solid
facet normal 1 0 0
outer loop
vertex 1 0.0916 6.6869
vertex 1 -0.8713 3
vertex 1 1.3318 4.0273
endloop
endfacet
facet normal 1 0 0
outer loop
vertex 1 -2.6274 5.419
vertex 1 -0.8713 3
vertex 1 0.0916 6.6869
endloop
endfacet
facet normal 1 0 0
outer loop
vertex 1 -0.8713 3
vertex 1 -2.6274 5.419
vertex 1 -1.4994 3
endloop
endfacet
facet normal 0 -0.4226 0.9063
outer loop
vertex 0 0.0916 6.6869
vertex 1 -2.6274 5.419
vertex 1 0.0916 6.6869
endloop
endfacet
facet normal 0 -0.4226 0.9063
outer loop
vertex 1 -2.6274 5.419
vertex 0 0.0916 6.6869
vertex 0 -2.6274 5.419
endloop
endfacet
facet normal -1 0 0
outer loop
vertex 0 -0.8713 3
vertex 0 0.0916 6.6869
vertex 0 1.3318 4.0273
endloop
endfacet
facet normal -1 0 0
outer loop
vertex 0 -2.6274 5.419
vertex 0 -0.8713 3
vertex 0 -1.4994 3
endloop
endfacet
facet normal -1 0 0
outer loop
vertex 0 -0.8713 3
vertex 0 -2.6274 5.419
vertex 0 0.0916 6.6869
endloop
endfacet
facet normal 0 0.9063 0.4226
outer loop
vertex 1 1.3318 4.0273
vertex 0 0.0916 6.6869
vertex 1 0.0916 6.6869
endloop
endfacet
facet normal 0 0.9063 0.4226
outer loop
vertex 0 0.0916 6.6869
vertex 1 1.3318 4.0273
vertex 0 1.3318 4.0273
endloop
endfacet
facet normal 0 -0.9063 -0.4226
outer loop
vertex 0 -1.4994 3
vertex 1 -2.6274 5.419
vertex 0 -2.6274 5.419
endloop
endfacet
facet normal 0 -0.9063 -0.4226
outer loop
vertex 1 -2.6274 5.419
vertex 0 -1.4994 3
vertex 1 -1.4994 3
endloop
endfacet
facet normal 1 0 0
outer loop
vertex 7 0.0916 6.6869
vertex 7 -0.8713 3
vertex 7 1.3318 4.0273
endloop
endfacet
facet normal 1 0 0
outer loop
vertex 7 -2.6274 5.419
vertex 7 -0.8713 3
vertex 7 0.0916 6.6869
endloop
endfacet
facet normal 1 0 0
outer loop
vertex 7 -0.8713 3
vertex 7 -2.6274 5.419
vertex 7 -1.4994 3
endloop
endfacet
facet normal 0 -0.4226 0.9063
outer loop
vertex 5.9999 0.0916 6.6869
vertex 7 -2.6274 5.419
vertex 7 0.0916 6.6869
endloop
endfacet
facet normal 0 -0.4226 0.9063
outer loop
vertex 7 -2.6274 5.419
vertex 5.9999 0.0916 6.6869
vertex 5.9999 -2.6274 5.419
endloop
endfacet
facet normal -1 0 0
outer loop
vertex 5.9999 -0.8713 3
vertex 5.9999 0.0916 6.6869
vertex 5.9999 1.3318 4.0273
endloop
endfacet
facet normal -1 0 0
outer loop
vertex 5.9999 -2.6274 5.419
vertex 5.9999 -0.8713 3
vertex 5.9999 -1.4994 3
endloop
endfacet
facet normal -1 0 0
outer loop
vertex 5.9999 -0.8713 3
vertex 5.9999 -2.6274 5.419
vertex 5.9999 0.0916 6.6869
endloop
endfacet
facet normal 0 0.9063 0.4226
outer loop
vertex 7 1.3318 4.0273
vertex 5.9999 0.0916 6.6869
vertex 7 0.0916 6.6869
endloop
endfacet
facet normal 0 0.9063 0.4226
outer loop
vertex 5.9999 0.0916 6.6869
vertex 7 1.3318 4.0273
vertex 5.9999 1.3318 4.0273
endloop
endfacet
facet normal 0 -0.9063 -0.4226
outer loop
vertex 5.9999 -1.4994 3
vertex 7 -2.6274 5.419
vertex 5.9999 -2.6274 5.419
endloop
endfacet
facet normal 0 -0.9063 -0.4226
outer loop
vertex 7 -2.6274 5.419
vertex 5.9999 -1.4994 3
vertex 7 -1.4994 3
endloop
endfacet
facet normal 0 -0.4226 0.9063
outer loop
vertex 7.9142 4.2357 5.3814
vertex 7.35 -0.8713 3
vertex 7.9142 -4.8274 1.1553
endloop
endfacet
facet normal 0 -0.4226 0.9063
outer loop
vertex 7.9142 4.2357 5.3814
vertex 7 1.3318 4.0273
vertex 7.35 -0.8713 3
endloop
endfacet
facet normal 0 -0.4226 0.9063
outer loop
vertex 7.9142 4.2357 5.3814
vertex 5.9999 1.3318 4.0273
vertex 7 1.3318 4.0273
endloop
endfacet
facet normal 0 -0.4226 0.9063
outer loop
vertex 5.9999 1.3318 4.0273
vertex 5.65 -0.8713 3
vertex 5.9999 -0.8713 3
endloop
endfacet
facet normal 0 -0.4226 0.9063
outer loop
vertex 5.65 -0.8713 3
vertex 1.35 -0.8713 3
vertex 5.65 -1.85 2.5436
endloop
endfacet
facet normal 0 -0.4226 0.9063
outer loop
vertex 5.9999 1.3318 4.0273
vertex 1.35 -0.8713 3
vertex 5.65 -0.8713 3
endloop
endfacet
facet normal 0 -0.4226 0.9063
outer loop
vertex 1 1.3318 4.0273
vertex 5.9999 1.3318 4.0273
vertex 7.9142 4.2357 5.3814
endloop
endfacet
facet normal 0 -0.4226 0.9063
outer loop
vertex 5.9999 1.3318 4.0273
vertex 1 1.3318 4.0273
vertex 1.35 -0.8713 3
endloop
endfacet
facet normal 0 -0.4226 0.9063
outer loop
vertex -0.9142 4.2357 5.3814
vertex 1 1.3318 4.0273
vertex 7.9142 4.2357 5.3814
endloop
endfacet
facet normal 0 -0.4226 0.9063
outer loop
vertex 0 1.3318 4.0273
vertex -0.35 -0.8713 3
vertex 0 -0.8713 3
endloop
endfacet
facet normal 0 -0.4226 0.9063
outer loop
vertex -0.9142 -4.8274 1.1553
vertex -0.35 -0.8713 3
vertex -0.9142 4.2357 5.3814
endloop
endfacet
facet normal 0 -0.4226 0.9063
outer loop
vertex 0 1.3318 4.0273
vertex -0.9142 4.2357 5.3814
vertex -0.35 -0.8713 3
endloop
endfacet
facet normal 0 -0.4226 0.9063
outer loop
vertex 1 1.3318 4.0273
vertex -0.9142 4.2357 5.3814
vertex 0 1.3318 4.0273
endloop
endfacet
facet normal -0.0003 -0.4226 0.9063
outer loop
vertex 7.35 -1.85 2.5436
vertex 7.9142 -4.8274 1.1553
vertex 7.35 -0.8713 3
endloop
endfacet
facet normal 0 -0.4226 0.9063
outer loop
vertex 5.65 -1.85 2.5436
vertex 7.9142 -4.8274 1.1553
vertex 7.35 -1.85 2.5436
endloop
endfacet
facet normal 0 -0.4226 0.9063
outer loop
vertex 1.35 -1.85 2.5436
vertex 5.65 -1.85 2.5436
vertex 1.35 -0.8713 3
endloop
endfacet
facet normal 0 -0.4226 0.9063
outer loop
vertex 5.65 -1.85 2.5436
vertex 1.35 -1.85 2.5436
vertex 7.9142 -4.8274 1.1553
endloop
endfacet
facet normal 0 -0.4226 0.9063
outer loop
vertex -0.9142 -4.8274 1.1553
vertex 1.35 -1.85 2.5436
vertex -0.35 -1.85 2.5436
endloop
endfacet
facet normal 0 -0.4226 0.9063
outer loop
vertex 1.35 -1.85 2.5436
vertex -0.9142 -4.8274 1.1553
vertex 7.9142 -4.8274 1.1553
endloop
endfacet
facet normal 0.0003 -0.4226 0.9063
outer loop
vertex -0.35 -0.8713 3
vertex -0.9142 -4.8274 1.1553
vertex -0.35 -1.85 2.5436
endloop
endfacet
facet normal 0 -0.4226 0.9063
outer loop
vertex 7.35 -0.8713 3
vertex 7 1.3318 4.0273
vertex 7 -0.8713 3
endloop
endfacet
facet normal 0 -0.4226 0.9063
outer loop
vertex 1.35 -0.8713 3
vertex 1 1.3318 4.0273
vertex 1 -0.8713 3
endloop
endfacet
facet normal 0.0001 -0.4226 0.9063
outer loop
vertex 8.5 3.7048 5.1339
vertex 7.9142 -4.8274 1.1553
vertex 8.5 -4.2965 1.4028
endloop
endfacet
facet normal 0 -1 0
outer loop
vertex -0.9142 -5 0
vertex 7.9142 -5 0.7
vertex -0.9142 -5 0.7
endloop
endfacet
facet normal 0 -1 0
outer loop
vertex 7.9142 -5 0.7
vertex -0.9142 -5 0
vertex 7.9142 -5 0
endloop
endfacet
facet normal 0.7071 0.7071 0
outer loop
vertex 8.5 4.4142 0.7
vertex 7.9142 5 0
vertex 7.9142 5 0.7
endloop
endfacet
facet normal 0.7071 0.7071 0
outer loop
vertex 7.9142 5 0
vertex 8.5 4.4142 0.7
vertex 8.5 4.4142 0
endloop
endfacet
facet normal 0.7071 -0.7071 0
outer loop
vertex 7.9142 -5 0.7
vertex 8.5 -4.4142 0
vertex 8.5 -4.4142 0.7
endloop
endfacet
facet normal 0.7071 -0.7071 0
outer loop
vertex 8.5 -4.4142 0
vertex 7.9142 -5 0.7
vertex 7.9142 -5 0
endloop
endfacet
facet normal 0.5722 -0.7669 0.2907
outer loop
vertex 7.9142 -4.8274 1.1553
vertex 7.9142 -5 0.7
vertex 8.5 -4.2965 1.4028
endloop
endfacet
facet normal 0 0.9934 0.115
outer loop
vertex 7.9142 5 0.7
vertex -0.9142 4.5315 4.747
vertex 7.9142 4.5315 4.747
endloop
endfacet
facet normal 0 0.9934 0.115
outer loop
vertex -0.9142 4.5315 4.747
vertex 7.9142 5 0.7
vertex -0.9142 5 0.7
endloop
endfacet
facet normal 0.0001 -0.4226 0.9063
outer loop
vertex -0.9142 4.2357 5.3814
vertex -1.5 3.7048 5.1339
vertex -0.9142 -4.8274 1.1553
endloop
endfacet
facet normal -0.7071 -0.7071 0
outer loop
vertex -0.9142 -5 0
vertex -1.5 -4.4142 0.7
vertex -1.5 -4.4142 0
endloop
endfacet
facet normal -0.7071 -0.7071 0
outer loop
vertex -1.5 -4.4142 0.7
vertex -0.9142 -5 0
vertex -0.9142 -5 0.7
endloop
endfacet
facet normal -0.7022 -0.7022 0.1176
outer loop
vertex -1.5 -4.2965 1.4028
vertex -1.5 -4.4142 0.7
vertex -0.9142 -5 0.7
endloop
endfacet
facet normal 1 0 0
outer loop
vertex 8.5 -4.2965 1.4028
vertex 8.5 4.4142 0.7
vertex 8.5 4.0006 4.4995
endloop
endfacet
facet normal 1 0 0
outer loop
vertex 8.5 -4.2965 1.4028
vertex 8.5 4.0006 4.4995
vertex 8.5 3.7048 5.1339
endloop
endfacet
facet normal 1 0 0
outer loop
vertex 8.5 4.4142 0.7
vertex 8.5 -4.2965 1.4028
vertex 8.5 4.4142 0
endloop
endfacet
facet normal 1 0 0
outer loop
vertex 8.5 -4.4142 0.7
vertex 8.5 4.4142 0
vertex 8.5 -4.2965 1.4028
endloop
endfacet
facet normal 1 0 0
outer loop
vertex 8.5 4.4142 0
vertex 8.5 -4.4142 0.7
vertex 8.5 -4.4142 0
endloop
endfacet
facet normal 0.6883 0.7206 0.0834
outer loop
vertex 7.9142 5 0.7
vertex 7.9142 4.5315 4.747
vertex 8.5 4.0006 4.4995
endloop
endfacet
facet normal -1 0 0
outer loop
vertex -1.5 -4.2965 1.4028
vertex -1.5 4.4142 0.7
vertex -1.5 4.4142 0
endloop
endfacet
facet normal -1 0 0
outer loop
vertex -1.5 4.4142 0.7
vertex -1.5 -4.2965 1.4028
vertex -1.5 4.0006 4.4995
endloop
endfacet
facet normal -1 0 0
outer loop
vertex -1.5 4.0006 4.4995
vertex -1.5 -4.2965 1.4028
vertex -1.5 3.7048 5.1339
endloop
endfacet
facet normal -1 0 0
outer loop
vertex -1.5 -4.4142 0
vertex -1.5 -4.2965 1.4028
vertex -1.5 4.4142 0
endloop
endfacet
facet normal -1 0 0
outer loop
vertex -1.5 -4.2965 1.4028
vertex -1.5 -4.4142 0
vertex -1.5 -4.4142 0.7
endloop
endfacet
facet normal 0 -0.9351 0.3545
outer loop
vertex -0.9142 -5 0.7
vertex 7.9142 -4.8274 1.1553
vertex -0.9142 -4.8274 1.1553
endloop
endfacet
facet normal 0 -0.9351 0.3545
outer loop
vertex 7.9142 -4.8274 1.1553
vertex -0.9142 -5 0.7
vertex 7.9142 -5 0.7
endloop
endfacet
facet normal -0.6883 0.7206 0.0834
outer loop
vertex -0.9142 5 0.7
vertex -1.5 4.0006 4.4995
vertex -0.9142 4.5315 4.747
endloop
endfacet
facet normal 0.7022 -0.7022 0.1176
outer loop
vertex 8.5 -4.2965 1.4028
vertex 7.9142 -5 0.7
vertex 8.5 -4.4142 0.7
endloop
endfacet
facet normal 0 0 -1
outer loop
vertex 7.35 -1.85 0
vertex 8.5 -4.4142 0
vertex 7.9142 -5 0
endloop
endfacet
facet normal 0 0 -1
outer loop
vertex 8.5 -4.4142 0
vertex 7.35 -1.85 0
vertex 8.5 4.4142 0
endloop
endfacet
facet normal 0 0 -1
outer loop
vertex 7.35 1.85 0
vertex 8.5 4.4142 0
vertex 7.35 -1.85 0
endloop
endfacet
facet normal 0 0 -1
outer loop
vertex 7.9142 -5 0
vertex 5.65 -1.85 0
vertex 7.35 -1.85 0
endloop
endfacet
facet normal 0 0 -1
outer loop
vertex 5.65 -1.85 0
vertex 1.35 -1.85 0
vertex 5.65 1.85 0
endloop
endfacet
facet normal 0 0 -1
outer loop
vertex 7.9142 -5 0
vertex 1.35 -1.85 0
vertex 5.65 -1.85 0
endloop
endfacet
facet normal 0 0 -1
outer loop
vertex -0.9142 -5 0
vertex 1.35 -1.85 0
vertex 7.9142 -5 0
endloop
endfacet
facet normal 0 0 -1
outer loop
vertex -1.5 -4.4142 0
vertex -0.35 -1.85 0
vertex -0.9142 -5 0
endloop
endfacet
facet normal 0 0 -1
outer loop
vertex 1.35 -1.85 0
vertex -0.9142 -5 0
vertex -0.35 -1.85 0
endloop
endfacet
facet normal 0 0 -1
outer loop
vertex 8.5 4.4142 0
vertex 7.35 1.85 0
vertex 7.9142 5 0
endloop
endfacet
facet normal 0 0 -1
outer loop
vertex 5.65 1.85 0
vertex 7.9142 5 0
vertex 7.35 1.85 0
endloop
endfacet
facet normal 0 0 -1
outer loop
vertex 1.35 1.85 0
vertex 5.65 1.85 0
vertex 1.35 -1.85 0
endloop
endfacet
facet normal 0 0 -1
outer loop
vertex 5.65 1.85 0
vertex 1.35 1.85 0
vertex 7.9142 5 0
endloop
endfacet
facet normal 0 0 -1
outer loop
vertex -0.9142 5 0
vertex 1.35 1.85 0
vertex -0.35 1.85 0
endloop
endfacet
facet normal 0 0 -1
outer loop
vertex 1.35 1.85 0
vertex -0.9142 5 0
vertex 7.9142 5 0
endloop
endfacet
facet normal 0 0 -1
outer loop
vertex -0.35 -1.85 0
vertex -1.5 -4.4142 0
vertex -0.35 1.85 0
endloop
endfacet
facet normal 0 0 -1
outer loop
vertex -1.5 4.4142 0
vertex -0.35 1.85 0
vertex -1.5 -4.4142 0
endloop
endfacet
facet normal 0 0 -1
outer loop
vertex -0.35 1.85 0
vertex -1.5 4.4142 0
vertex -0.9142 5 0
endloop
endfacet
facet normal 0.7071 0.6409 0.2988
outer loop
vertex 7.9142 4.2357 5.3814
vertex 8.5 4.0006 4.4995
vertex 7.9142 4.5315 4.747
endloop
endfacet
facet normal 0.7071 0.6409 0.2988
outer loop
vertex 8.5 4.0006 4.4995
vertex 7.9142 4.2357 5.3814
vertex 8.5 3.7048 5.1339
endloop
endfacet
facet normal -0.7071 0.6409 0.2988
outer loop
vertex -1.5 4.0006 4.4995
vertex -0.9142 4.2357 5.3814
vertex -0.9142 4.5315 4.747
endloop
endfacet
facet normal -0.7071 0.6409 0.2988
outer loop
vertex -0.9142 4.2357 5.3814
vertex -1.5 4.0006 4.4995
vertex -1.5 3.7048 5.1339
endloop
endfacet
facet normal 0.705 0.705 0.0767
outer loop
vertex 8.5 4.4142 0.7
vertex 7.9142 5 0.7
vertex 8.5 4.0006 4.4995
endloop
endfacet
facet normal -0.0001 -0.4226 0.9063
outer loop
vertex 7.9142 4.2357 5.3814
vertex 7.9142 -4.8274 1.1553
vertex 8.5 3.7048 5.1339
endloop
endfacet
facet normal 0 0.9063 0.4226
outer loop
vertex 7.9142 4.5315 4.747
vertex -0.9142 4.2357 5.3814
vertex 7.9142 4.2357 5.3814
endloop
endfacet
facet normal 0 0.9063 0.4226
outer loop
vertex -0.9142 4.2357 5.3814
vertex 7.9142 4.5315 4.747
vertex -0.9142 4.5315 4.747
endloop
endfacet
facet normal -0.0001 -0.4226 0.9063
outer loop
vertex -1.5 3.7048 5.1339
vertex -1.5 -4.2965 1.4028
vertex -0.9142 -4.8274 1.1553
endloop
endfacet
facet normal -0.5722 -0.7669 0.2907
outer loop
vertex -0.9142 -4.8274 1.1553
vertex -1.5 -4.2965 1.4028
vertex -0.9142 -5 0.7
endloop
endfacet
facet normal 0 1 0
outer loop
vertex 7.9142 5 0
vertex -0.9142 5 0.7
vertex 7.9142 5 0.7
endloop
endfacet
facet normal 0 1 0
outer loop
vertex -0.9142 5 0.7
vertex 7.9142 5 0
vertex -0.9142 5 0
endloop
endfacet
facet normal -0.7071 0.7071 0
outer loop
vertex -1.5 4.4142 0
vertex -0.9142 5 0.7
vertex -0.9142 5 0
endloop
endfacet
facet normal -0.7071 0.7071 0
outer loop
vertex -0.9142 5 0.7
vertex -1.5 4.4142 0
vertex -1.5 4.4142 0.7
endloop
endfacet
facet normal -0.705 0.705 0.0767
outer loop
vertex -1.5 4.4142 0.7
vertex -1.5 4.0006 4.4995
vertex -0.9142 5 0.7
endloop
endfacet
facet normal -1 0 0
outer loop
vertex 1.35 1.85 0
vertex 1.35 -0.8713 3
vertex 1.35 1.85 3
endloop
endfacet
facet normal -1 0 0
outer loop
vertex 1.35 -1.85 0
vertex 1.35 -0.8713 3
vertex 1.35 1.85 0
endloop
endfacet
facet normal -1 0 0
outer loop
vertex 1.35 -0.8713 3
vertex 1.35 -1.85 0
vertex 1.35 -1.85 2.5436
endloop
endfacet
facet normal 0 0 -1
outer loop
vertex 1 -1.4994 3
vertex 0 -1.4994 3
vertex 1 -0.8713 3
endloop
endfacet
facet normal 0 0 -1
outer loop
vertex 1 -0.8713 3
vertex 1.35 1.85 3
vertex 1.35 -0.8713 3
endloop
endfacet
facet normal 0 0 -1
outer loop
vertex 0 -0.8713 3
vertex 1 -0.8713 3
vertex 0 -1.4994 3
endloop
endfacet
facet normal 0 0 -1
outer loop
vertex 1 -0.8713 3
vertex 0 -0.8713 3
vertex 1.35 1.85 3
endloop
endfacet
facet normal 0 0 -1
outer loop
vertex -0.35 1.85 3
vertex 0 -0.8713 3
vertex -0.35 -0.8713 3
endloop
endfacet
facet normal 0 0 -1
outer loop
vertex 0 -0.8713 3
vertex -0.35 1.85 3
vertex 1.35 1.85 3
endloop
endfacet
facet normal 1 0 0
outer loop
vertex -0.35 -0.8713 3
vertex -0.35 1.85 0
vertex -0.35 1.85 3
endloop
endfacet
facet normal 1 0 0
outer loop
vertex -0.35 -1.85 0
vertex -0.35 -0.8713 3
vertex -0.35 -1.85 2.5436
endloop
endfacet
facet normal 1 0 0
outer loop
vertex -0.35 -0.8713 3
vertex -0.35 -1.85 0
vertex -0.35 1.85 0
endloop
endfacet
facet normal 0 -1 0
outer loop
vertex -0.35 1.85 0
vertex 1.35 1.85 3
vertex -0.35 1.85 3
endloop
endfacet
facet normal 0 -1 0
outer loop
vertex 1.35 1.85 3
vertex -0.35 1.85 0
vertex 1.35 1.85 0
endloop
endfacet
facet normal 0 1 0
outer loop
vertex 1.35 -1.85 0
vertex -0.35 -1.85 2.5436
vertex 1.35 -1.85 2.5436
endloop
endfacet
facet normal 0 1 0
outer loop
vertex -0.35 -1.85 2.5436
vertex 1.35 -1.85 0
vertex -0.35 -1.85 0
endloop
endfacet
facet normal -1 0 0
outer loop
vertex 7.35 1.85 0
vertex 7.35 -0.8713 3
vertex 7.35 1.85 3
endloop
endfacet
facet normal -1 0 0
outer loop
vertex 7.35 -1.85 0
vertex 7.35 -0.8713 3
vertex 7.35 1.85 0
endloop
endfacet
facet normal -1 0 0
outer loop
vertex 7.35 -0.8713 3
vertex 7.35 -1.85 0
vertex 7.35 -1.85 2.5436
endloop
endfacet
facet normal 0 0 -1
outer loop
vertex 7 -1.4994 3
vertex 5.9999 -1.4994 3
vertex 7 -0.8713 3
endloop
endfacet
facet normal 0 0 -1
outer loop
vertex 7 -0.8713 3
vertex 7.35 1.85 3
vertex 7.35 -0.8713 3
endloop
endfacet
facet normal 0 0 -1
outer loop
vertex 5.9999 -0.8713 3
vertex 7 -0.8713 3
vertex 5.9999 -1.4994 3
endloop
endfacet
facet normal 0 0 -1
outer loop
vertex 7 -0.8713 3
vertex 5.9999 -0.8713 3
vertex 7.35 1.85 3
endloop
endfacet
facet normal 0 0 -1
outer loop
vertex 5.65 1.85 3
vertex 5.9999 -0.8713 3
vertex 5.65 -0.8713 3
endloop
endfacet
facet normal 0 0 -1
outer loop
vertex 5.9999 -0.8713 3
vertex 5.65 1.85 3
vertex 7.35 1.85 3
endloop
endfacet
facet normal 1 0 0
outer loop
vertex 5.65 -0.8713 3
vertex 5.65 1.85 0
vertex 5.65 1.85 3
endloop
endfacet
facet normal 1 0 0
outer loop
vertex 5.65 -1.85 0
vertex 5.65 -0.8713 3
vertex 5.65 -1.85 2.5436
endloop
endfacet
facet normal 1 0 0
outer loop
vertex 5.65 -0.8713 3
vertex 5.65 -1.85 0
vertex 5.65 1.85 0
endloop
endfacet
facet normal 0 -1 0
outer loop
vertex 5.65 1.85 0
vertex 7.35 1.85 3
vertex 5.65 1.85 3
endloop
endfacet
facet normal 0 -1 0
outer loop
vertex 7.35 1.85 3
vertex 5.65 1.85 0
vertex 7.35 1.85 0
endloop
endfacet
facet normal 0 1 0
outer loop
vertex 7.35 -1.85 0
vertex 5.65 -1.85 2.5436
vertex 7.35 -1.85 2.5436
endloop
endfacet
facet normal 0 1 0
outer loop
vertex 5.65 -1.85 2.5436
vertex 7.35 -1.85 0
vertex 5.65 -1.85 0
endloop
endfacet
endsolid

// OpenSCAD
$fn=100;
g=0.7;
angle=25;
t=1;
height=2+1.5*sin(angle);

difference() {
  union () {
    tilt();
    translate([0,0,height+g])
    rotate([angle,0,0])
    pins();
  }
  translate([0,0,-g])
  pins(inner=true);
}


module tilt() {
    hull() {
      plate();
      translate([0,0,height])
      rotate([angle,0,0])
      plate();
    }
  }

module plate() {
    translate([-t/2,-4,0])
    linear_extrude(g)
    offset(delta=t, chamfer=true)
    square(8);
  }

module pins(inner=false) {
    gap = inner ? g : 0.0001;
    translate([0,-3/2-gap/2,0]) {
      translate([-gap/2,0,0])
      pin(gap);
      translate([6-gap/2,0,0])
      pin(gap);
    }
  }

module pin(gap) {
    size = [1+gap,3+gap,3+gap];
    cube(size);
  }
